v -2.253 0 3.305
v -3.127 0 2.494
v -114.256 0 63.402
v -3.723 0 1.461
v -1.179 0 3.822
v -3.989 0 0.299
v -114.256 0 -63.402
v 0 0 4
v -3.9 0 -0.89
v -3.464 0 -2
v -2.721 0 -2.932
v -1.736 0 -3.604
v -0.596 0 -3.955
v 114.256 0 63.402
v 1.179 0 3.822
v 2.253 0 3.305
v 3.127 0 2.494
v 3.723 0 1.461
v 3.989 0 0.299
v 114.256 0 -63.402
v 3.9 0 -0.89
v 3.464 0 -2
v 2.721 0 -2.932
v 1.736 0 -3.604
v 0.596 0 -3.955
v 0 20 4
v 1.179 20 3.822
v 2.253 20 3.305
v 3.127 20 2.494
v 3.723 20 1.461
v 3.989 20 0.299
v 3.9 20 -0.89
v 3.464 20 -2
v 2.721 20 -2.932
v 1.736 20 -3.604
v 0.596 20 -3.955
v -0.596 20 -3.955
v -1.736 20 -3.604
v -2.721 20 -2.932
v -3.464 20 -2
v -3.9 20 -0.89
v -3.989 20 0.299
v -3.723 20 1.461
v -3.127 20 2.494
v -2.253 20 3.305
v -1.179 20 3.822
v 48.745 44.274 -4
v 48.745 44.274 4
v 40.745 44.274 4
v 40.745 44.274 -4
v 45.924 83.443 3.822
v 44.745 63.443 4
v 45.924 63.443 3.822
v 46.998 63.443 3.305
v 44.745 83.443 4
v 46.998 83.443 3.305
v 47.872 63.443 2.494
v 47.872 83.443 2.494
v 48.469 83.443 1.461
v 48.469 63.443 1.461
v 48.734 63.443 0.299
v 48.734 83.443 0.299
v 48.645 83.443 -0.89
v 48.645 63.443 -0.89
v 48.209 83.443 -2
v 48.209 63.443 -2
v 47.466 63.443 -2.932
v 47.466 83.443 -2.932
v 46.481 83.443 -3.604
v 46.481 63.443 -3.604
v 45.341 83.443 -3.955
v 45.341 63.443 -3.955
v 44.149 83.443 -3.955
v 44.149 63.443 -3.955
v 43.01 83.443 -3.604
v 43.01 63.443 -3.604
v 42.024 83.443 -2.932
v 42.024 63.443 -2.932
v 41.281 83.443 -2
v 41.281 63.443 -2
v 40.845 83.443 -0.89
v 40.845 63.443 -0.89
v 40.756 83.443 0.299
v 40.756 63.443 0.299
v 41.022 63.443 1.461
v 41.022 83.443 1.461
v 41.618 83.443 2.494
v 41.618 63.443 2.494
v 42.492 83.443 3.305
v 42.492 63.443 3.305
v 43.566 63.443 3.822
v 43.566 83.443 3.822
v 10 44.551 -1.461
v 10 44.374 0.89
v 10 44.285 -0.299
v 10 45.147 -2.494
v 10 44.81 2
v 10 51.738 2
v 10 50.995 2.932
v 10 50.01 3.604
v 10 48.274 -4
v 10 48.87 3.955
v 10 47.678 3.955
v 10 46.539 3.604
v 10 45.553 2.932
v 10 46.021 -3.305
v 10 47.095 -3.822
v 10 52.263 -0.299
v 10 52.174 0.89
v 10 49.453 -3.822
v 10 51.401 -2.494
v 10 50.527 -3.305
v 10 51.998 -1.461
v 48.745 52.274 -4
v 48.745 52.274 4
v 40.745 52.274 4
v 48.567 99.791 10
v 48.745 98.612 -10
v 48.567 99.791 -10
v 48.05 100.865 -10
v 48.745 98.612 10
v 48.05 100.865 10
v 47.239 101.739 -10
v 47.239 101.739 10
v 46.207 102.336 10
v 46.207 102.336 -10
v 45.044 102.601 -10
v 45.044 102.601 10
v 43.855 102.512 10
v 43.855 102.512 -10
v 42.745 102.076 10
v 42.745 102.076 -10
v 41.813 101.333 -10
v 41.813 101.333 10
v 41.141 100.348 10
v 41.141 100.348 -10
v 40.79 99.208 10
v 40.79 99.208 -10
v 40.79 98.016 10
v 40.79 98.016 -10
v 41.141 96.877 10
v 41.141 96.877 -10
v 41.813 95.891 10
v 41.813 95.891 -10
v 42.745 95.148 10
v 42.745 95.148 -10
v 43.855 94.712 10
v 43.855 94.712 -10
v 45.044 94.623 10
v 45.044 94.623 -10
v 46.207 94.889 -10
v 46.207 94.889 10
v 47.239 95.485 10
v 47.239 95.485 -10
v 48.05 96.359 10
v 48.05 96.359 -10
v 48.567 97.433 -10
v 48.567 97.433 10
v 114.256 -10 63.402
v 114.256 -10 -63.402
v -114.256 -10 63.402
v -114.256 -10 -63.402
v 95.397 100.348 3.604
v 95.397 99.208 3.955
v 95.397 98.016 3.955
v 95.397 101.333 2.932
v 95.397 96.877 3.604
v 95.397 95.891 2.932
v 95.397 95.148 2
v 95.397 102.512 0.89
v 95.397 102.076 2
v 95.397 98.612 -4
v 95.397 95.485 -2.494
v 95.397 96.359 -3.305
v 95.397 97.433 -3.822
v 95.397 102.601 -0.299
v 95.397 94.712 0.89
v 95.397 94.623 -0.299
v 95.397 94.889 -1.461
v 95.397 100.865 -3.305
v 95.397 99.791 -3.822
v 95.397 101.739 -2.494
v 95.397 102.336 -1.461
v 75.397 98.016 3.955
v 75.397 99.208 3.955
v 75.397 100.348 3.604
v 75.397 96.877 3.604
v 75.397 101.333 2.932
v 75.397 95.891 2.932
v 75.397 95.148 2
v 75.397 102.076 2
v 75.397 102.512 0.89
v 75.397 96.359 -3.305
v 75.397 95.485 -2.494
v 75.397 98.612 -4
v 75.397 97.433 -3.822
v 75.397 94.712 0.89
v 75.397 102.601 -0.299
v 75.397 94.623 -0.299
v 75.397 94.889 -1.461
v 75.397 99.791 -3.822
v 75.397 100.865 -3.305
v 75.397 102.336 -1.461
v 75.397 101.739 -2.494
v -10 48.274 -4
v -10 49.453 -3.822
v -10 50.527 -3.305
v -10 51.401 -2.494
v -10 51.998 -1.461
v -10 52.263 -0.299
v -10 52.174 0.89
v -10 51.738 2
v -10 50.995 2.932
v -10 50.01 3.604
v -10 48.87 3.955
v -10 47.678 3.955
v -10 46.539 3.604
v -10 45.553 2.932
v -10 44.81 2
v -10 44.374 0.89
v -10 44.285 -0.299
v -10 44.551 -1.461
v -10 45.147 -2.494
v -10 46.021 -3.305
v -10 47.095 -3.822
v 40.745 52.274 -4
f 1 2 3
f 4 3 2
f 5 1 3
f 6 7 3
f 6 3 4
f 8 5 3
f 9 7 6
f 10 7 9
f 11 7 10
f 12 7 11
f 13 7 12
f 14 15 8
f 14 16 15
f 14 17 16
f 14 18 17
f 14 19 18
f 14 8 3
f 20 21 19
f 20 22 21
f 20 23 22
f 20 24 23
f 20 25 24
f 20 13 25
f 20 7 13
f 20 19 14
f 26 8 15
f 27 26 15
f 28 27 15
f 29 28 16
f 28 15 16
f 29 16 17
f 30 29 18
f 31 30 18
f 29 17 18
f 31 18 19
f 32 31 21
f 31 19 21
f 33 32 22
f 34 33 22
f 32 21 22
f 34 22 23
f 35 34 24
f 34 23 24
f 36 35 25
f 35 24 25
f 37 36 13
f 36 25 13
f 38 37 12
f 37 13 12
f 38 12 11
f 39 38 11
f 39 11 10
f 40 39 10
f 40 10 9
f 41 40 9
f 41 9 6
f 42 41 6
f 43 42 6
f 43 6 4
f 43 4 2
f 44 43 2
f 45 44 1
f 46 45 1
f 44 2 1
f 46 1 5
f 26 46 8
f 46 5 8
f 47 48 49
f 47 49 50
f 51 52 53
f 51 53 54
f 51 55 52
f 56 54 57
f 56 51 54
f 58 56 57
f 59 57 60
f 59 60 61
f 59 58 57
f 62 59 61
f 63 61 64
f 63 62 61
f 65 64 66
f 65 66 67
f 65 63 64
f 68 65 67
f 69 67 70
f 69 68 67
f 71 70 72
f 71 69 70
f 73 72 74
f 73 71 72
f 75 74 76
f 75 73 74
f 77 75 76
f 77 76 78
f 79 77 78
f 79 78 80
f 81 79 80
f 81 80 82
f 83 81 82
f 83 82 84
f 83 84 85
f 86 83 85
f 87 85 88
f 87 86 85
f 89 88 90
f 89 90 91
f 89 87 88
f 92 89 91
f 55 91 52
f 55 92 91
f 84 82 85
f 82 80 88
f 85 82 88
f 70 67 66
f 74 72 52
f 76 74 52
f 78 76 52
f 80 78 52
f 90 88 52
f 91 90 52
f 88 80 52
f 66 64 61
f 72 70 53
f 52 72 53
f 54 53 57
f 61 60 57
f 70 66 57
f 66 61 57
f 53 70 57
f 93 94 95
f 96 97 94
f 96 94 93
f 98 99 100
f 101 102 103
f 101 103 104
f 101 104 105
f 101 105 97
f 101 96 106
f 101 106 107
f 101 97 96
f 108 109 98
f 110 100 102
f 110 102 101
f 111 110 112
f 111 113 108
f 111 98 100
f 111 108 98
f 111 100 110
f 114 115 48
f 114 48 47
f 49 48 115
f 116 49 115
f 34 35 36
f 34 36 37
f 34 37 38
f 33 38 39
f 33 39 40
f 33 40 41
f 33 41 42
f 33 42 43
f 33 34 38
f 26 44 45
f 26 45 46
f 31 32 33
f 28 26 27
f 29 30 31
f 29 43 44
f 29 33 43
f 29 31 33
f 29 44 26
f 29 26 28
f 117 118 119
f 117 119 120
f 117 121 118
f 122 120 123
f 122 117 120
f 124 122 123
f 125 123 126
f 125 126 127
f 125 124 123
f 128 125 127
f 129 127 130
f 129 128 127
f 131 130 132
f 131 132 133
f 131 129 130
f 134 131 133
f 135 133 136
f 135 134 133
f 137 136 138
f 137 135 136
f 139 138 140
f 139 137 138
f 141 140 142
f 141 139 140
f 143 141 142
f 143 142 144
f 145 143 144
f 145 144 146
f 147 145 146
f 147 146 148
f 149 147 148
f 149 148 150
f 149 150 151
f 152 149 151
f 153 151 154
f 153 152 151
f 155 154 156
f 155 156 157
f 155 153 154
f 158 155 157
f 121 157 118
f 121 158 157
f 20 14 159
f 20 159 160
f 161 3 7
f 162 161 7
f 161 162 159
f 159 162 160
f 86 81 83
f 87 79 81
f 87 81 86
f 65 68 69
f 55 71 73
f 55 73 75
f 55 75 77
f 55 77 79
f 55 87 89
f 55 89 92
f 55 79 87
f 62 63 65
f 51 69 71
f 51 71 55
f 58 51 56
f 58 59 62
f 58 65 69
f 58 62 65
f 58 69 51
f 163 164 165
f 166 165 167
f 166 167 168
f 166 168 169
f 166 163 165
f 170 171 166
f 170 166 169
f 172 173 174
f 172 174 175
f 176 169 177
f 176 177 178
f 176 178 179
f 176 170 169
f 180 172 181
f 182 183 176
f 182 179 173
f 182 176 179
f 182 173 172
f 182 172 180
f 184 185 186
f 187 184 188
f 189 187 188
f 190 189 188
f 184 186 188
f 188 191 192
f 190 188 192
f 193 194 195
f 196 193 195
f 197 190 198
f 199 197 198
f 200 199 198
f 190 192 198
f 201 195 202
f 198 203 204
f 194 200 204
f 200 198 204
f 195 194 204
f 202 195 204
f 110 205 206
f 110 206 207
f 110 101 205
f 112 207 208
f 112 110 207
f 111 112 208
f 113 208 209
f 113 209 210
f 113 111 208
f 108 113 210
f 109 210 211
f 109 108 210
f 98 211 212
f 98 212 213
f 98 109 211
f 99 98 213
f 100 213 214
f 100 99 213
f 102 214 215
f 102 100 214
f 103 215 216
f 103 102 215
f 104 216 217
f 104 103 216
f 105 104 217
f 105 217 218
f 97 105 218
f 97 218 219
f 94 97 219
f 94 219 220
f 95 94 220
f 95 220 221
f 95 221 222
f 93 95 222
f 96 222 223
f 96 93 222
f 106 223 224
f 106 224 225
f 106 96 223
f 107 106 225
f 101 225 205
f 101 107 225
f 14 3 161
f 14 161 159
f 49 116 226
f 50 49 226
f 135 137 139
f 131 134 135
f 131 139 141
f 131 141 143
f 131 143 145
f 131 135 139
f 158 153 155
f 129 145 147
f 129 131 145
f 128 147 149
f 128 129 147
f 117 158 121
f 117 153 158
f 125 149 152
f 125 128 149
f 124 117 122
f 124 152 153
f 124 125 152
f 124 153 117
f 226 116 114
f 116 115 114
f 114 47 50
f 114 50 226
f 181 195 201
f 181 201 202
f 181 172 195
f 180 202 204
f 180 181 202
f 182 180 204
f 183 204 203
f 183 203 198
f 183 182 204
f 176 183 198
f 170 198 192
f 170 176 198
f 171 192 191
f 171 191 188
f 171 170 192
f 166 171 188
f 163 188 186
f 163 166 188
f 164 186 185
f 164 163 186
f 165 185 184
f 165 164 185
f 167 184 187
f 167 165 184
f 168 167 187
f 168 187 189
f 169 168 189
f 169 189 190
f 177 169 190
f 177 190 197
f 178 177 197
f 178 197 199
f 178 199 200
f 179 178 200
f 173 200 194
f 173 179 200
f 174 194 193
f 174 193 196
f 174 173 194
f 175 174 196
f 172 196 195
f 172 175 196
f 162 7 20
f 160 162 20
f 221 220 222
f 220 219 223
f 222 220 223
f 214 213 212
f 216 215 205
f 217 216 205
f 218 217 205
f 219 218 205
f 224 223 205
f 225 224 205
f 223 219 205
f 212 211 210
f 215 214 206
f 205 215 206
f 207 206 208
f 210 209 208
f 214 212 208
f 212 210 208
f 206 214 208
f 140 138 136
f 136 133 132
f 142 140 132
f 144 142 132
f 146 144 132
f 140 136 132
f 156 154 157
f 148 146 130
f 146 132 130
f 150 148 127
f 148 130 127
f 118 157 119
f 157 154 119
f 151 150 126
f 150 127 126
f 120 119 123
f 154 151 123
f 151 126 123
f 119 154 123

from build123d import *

# Parameters (mm, degrees)
SKETCH1_W           = 228.511799864
SKETCH1_H           = 126.804235764
BOSS_EXTRUDE1_DEPTH = 10
SKETCH2_R           = 4
BOSS_EXTRUDE2_DEPTH = 20
SKETCH3_R           = 4
BOSS_EXTRUDE3_DEPTH = 10
SKETCH4_W           = 8
SKETCH4_H           = 8
BOSS_EXTRUDE4_DEPTH = 4
SKETCH5_R           = 4
BOSS_EXTRUDE5_DEPTH = 10
SKETCH7_R           = 4
BOSS_EXTRUDE6_DEPTH = 10
SKETCH9_R           = 4
BOSS_EXTRUDE7_DEPTH = 10


with BuildPart() as part:
    # Sketch1 → Boss-Extrude1 (new body)
    with BuildSketch(Plane(origin=(0, 0, 0), x_dir=(1, 0, 0), z_dir=(0, 1, 0))):
        Rectangle(SKETCH1_W, SKETCH1_H)
    extrude(amount=-BOSS_EXTRUDE1_DEPTH)

    # Sketch2 → Boss-Extrude2 (add)
    with BuildSketch(Plane(origin=(0, 0, 0), x_dir=(1, 0, 0), z_dir=(0, 1, 0))):
        with Locations(Location((0, 0, 0), (0, 0, 270))):
            Circle(SKETCH2_R)
    extrude(amount=BOSS_EXTRUDE2_DEPTH)


with BuildPart() as body_2:
    # Sketch3 → Boss-Extrude3 (new, symmetric)
    with BuildSketch(Plane(origin=(0, 0, 0), x_dir=(0, 0, -1), z_dir=(1, 0, 0))):
        with Locations((0, 48.274165168)):
            Circle(SKETCH3_R)
    extrude(amount=BOSS_EXTRUDE3_DEPTH, both=True)


with BuildPart() as body_3:
    # Sketch4 → Boss-Extrude4 (new, symmetric)
    with BuildSketch(Plane(origin=(44.745139913, 0, 0), x_dir=(0, 0, -1), z_dir=(1, 0, 0))):
        with Locations((0, 48.274165168)):
            Rectangle(SKETCH4_W, SKETCH4_H)
    extrude(amount=BOSS_EXTRUDE4_DEPTH, both=True)


with BuildPart() as body_4:
    # Sketch5 → Boss-Extrude5 (new, symmetric)
    with BuildSketch(Plane(origin=(0, 73.443144658, 0), x_dir=(1, 0, 0), z_dir=(0, 1, 0))):
        with Locations(Location((44.745139913, 0, 0), (0, 0, 270))):
            Circle(SKETCH5_R)
    extrude(amount=BOSS_EXTRUDE5_DEPTH, both=True)


with BuildPart() as body_5:
    # Sketch7 → Boss-Extrude6 (new, symmetric)
    with BuildSketch(Plane.XY):
        with Locations((44.745139913, 98.612124149)):
            Circle(SKETCH7_R)
    extrude(amount=BOSS_EXTRUDE6_DEPTH, both=True)


with BuildPart() as body_6:
    # Sketch9 → Boss-Extrude7 (new, symmetric)
    with BuildSketch(Plane(origin=(85.396981005, 0, 0), x_dir=(0, 0, -1), z_dir=(1, 0, 0))):
        with Locations((0, 98.612124149)):
            Circle(SKETCH9_R)
    extrude(amount=BOSS_EXTRUDE7_DEPTH, both=True)


solid = Compound([part.part, body_2.part, body_3.part, body_4.part, body_5.part, body_6.part])
